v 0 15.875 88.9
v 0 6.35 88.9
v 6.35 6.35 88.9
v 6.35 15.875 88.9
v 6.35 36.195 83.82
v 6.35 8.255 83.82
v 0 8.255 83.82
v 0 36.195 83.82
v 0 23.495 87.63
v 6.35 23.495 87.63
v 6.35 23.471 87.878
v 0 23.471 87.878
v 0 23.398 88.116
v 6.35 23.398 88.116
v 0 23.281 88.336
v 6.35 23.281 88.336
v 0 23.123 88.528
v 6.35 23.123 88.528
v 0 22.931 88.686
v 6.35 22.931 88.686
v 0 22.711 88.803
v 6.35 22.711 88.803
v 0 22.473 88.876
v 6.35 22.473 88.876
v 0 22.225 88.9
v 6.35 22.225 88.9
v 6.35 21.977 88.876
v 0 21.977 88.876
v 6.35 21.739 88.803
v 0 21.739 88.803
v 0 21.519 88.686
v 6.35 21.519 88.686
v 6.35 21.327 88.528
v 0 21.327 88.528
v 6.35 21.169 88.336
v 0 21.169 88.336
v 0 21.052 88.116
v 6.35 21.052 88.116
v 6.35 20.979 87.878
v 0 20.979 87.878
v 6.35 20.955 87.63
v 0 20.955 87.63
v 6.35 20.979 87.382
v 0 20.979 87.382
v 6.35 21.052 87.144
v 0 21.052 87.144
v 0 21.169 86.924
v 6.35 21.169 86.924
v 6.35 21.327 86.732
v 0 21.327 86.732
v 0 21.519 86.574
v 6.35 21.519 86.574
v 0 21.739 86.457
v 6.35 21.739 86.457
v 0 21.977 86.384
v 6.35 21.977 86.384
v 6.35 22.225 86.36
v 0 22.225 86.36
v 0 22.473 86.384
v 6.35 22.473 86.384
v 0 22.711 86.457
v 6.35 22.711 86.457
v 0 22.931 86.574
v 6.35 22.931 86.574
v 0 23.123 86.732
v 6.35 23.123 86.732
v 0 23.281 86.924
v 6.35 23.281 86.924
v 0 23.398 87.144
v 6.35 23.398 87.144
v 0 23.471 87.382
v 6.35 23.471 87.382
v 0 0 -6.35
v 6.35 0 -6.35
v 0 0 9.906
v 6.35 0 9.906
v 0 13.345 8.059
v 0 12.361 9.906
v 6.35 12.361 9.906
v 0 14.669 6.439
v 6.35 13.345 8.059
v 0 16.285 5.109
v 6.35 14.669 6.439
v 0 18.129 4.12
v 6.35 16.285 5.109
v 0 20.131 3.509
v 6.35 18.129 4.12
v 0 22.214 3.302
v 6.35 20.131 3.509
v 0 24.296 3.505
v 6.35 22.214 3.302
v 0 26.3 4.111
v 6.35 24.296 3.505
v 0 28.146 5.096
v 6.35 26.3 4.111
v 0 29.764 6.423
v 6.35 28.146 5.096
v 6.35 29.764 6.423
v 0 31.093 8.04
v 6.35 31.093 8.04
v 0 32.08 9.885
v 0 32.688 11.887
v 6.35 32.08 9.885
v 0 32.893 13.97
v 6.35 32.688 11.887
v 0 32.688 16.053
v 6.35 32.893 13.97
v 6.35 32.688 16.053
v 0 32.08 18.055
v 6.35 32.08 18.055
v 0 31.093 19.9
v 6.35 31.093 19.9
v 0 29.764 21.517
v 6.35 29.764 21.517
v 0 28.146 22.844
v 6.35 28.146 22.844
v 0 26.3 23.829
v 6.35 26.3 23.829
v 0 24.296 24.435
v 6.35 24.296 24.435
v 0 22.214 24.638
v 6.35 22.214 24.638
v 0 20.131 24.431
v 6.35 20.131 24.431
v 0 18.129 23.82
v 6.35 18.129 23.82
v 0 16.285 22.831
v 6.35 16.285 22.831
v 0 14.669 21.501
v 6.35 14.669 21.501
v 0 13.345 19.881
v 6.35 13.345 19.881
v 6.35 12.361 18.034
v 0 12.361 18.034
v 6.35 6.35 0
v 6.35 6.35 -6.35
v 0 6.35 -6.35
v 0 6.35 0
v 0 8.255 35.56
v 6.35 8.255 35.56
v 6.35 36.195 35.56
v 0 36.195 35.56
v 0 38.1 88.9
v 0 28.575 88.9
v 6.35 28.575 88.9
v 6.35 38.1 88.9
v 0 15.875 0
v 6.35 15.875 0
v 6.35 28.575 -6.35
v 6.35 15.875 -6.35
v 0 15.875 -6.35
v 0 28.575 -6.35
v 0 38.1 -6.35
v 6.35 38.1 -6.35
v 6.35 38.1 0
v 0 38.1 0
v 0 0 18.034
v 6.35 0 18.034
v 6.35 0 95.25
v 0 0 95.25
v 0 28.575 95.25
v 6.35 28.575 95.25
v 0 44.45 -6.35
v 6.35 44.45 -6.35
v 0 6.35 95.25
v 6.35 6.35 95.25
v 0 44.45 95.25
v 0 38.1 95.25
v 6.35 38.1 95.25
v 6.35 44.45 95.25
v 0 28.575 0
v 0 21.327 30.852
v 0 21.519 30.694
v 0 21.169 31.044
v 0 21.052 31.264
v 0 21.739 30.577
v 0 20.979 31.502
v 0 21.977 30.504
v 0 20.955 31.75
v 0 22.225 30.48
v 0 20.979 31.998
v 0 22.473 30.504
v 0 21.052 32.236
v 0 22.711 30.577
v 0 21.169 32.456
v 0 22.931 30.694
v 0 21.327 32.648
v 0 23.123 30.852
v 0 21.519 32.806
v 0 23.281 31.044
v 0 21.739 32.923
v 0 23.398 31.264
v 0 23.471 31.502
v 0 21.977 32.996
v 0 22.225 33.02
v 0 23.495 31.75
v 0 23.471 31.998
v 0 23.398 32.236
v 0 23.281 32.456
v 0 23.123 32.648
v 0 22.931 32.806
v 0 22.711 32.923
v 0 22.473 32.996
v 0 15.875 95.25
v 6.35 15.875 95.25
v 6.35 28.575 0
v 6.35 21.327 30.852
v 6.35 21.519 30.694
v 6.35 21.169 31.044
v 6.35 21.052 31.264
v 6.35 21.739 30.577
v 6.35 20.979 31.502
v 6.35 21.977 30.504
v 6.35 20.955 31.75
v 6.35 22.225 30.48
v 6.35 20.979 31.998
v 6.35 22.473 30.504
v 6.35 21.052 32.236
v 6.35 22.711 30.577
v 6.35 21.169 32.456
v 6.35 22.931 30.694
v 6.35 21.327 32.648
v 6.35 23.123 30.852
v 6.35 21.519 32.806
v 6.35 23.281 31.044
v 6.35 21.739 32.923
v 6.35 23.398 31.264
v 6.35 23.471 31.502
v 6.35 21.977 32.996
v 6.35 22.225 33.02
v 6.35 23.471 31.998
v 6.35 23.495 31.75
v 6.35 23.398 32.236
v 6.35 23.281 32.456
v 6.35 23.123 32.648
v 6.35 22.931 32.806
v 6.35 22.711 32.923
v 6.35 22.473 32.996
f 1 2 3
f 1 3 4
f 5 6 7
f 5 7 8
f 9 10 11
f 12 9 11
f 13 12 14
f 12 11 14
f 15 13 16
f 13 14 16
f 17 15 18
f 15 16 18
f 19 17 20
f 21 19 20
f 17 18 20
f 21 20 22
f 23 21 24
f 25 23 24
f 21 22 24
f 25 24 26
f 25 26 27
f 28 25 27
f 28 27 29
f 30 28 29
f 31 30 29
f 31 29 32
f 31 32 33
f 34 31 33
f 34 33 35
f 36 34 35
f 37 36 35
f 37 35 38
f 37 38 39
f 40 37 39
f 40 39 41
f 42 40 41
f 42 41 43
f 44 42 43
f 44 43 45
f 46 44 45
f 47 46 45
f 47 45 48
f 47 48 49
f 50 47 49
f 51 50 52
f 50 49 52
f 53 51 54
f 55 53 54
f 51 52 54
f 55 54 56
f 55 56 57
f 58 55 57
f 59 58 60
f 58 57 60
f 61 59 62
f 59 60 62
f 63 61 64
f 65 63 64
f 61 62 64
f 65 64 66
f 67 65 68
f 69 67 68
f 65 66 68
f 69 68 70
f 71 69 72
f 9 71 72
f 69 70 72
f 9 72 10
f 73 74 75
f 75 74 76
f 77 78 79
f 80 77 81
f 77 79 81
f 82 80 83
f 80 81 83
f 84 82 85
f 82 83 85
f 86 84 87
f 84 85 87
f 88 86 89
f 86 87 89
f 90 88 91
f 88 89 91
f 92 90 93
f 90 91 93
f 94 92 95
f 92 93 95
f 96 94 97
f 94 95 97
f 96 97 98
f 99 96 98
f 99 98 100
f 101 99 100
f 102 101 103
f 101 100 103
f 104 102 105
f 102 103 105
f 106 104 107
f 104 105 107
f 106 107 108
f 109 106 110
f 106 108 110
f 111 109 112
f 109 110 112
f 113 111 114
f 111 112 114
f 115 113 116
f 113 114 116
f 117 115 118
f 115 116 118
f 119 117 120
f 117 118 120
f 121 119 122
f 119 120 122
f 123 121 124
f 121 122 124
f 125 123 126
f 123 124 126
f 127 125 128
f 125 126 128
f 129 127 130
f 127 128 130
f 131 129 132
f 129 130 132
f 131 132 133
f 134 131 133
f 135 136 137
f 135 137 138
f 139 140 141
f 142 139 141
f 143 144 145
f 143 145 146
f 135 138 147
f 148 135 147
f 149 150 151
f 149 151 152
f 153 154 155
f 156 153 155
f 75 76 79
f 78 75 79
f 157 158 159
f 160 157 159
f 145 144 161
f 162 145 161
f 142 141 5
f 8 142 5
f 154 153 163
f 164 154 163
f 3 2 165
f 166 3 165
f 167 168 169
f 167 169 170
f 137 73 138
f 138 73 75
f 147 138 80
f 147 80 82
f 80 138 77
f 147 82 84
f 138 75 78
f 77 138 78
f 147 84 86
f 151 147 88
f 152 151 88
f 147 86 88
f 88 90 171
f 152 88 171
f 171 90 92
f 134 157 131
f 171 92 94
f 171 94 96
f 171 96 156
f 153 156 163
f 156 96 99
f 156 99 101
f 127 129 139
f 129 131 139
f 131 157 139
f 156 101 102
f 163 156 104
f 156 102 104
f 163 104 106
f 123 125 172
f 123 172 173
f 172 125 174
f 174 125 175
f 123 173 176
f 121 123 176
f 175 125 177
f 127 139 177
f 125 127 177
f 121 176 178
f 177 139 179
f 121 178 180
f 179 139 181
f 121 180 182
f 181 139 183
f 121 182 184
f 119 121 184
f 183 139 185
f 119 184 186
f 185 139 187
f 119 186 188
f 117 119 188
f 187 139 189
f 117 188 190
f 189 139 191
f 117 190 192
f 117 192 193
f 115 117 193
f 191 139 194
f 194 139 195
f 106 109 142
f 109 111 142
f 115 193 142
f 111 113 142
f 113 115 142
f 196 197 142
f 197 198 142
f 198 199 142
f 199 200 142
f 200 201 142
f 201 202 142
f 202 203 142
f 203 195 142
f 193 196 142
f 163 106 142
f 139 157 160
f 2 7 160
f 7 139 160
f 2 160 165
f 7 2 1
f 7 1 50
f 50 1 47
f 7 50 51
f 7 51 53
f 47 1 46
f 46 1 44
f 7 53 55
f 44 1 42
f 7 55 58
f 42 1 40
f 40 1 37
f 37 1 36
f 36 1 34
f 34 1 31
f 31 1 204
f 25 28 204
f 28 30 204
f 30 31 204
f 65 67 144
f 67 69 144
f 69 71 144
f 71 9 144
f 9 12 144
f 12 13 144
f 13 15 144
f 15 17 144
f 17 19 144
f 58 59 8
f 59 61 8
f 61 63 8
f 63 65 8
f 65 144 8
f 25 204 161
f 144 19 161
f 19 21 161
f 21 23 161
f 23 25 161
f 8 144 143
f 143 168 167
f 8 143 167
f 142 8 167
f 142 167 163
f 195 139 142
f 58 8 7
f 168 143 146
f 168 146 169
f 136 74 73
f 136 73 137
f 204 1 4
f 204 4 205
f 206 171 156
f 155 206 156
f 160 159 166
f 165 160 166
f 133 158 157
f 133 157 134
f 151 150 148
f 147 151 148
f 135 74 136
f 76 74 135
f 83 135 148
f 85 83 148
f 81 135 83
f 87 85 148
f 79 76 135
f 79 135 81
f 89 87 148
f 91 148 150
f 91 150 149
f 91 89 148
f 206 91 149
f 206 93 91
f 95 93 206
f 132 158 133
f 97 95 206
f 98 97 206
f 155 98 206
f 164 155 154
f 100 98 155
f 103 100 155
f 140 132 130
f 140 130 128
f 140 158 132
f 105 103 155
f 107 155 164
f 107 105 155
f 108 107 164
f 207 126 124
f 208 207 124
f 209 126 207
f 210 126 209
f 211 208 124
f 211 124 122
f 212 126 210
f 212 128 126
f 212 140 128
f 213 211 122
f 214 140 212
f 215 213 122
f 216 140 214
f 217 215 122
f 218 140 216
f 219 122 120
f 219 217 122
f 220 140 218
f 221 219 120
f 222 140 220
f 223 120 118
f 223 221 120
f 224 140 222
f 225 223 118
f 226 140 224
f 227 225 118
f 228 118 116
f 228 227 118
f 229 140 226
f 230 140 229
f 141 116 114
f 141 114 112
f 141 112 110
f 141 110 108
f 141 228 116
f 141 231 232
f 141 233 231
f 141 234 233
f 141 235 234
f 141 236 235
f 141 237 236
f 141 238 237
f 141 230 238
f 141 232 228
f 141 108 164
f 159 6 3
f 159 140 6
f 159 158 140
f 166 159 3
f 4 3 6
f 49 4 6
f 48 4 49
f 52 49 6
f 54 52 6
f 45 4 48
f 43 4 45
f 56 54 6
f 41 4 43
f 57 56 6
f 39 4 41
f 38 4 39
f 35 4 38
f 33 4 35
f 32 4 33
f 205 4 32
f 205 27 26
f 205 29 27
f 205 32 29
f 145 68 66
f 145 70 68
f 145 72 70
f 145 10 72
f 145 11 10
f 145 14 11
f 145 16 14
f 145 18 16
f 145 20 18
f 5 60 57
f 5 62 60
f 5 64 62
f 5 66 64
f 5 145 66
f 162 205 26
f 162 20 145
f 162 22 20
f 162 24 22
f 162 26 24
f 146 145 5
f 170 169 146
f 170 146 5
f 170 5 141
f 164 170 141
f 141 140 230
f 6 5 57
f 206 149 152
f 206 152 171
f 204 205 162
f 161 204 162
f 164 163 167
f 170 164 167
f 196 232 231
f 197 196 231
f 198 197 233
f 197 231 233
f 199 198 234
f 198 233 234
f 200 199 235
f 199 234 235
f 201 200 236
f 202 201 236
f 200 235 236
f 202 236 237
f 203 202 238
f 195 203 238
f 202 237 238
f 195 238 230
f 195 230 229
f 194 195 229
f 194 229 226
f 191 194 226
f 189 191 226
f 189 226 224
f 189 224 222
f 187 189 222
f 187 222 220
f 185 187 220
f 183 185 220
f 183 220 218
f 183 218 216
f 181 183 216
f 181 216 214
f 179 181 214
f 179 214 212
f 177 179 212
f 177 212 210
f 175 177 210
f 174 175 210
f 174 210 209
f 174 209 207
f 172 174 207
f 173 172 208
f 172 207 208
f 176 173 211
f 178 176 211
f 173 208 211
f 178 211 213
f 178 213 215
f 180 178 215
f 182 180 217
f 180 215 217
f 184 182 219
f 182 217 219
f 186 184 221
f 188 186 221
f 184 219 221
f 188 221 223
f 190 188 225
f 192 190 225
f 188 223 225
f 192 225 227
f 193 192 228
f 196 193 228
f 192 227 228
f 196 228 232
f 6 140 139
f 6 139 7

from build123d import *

# Parameters (mm, degrees)
F0_W     = 44.45
F0_H     = 88.9
F1_DEPTH = 6.35
F2_W     = 6.35
F2_H     = 6.35
F2_W_2   = 12.7
F3_DEPTH = 6.35
F4_R     = 10.668
F4_W     = 27.94
F4_H     = 48.26
F4_R_2   = 1.27
F5_DEPTH = 25.4
F6_W     = 12.361424
F6_H     = 8.128
F7_DEPTH = 25.4


with BuildPart() as f1:
    # F0 (on Right) → F1 (new body)
    with BuildSketch(Plane.YZ):
        with Locations((22.225, 44.45)):
            Rectangle(F0_W, F0_H)
    extrude(amount=F1_DEPTH)

    # F2 (on face) → F3 (join)
    with BuildSketch(Plane.YZ.offset(6.35)):
        with Locations((3.175, 92.075)):
            Rectangle(F2_W, F2_H)
        with Locations((3.175, -3.175)):
            Rectangle(F2_W, F2_H)
        with Locations((41.275, 92.075)):
            Rectangle(F2_W, F2_H)
        with Locations((41.275, -3.175)):
            Rectangle(F2_W, F2_H)
        with Locations((22.225, 92.075)):
            Rectangle(F2_W_2, F2_H)
        with Locations((22.225, -3.175)):
            Rectangle(F2_W_2, F2_H)
    extrude(amount=-F3_DEPTH)

    # F4 (on face) → F5 (cut)
    with BuildSketch(Plane.YZ.offset(6.35)):
        with Locations((22.225, 13.97)):
            Circle(F4_R)
        with Locations((22.225, 59.69)):
            Rectangle(F4_W, F4_H)
        with Locations((22.225, 87.63)):
            Circle(F4_R_2)
        with Locations((22.225, 31.75)):
            Circle(F4_R_2)
    extrude(amount=-F5_DEPTH, mode=Mode.SUBTRACT)

    # F6 (on face) → F7 (cut)
    with BuildSketch(Plane.YZ.offset(6.35)):
        with Locations((6.180712, 13.97)):
            Rectangle(F6_W, F6_H)
    extrude(amount=-F7_DEPTH, mode=Mode.SUBTRACT)


solid = f1.part
